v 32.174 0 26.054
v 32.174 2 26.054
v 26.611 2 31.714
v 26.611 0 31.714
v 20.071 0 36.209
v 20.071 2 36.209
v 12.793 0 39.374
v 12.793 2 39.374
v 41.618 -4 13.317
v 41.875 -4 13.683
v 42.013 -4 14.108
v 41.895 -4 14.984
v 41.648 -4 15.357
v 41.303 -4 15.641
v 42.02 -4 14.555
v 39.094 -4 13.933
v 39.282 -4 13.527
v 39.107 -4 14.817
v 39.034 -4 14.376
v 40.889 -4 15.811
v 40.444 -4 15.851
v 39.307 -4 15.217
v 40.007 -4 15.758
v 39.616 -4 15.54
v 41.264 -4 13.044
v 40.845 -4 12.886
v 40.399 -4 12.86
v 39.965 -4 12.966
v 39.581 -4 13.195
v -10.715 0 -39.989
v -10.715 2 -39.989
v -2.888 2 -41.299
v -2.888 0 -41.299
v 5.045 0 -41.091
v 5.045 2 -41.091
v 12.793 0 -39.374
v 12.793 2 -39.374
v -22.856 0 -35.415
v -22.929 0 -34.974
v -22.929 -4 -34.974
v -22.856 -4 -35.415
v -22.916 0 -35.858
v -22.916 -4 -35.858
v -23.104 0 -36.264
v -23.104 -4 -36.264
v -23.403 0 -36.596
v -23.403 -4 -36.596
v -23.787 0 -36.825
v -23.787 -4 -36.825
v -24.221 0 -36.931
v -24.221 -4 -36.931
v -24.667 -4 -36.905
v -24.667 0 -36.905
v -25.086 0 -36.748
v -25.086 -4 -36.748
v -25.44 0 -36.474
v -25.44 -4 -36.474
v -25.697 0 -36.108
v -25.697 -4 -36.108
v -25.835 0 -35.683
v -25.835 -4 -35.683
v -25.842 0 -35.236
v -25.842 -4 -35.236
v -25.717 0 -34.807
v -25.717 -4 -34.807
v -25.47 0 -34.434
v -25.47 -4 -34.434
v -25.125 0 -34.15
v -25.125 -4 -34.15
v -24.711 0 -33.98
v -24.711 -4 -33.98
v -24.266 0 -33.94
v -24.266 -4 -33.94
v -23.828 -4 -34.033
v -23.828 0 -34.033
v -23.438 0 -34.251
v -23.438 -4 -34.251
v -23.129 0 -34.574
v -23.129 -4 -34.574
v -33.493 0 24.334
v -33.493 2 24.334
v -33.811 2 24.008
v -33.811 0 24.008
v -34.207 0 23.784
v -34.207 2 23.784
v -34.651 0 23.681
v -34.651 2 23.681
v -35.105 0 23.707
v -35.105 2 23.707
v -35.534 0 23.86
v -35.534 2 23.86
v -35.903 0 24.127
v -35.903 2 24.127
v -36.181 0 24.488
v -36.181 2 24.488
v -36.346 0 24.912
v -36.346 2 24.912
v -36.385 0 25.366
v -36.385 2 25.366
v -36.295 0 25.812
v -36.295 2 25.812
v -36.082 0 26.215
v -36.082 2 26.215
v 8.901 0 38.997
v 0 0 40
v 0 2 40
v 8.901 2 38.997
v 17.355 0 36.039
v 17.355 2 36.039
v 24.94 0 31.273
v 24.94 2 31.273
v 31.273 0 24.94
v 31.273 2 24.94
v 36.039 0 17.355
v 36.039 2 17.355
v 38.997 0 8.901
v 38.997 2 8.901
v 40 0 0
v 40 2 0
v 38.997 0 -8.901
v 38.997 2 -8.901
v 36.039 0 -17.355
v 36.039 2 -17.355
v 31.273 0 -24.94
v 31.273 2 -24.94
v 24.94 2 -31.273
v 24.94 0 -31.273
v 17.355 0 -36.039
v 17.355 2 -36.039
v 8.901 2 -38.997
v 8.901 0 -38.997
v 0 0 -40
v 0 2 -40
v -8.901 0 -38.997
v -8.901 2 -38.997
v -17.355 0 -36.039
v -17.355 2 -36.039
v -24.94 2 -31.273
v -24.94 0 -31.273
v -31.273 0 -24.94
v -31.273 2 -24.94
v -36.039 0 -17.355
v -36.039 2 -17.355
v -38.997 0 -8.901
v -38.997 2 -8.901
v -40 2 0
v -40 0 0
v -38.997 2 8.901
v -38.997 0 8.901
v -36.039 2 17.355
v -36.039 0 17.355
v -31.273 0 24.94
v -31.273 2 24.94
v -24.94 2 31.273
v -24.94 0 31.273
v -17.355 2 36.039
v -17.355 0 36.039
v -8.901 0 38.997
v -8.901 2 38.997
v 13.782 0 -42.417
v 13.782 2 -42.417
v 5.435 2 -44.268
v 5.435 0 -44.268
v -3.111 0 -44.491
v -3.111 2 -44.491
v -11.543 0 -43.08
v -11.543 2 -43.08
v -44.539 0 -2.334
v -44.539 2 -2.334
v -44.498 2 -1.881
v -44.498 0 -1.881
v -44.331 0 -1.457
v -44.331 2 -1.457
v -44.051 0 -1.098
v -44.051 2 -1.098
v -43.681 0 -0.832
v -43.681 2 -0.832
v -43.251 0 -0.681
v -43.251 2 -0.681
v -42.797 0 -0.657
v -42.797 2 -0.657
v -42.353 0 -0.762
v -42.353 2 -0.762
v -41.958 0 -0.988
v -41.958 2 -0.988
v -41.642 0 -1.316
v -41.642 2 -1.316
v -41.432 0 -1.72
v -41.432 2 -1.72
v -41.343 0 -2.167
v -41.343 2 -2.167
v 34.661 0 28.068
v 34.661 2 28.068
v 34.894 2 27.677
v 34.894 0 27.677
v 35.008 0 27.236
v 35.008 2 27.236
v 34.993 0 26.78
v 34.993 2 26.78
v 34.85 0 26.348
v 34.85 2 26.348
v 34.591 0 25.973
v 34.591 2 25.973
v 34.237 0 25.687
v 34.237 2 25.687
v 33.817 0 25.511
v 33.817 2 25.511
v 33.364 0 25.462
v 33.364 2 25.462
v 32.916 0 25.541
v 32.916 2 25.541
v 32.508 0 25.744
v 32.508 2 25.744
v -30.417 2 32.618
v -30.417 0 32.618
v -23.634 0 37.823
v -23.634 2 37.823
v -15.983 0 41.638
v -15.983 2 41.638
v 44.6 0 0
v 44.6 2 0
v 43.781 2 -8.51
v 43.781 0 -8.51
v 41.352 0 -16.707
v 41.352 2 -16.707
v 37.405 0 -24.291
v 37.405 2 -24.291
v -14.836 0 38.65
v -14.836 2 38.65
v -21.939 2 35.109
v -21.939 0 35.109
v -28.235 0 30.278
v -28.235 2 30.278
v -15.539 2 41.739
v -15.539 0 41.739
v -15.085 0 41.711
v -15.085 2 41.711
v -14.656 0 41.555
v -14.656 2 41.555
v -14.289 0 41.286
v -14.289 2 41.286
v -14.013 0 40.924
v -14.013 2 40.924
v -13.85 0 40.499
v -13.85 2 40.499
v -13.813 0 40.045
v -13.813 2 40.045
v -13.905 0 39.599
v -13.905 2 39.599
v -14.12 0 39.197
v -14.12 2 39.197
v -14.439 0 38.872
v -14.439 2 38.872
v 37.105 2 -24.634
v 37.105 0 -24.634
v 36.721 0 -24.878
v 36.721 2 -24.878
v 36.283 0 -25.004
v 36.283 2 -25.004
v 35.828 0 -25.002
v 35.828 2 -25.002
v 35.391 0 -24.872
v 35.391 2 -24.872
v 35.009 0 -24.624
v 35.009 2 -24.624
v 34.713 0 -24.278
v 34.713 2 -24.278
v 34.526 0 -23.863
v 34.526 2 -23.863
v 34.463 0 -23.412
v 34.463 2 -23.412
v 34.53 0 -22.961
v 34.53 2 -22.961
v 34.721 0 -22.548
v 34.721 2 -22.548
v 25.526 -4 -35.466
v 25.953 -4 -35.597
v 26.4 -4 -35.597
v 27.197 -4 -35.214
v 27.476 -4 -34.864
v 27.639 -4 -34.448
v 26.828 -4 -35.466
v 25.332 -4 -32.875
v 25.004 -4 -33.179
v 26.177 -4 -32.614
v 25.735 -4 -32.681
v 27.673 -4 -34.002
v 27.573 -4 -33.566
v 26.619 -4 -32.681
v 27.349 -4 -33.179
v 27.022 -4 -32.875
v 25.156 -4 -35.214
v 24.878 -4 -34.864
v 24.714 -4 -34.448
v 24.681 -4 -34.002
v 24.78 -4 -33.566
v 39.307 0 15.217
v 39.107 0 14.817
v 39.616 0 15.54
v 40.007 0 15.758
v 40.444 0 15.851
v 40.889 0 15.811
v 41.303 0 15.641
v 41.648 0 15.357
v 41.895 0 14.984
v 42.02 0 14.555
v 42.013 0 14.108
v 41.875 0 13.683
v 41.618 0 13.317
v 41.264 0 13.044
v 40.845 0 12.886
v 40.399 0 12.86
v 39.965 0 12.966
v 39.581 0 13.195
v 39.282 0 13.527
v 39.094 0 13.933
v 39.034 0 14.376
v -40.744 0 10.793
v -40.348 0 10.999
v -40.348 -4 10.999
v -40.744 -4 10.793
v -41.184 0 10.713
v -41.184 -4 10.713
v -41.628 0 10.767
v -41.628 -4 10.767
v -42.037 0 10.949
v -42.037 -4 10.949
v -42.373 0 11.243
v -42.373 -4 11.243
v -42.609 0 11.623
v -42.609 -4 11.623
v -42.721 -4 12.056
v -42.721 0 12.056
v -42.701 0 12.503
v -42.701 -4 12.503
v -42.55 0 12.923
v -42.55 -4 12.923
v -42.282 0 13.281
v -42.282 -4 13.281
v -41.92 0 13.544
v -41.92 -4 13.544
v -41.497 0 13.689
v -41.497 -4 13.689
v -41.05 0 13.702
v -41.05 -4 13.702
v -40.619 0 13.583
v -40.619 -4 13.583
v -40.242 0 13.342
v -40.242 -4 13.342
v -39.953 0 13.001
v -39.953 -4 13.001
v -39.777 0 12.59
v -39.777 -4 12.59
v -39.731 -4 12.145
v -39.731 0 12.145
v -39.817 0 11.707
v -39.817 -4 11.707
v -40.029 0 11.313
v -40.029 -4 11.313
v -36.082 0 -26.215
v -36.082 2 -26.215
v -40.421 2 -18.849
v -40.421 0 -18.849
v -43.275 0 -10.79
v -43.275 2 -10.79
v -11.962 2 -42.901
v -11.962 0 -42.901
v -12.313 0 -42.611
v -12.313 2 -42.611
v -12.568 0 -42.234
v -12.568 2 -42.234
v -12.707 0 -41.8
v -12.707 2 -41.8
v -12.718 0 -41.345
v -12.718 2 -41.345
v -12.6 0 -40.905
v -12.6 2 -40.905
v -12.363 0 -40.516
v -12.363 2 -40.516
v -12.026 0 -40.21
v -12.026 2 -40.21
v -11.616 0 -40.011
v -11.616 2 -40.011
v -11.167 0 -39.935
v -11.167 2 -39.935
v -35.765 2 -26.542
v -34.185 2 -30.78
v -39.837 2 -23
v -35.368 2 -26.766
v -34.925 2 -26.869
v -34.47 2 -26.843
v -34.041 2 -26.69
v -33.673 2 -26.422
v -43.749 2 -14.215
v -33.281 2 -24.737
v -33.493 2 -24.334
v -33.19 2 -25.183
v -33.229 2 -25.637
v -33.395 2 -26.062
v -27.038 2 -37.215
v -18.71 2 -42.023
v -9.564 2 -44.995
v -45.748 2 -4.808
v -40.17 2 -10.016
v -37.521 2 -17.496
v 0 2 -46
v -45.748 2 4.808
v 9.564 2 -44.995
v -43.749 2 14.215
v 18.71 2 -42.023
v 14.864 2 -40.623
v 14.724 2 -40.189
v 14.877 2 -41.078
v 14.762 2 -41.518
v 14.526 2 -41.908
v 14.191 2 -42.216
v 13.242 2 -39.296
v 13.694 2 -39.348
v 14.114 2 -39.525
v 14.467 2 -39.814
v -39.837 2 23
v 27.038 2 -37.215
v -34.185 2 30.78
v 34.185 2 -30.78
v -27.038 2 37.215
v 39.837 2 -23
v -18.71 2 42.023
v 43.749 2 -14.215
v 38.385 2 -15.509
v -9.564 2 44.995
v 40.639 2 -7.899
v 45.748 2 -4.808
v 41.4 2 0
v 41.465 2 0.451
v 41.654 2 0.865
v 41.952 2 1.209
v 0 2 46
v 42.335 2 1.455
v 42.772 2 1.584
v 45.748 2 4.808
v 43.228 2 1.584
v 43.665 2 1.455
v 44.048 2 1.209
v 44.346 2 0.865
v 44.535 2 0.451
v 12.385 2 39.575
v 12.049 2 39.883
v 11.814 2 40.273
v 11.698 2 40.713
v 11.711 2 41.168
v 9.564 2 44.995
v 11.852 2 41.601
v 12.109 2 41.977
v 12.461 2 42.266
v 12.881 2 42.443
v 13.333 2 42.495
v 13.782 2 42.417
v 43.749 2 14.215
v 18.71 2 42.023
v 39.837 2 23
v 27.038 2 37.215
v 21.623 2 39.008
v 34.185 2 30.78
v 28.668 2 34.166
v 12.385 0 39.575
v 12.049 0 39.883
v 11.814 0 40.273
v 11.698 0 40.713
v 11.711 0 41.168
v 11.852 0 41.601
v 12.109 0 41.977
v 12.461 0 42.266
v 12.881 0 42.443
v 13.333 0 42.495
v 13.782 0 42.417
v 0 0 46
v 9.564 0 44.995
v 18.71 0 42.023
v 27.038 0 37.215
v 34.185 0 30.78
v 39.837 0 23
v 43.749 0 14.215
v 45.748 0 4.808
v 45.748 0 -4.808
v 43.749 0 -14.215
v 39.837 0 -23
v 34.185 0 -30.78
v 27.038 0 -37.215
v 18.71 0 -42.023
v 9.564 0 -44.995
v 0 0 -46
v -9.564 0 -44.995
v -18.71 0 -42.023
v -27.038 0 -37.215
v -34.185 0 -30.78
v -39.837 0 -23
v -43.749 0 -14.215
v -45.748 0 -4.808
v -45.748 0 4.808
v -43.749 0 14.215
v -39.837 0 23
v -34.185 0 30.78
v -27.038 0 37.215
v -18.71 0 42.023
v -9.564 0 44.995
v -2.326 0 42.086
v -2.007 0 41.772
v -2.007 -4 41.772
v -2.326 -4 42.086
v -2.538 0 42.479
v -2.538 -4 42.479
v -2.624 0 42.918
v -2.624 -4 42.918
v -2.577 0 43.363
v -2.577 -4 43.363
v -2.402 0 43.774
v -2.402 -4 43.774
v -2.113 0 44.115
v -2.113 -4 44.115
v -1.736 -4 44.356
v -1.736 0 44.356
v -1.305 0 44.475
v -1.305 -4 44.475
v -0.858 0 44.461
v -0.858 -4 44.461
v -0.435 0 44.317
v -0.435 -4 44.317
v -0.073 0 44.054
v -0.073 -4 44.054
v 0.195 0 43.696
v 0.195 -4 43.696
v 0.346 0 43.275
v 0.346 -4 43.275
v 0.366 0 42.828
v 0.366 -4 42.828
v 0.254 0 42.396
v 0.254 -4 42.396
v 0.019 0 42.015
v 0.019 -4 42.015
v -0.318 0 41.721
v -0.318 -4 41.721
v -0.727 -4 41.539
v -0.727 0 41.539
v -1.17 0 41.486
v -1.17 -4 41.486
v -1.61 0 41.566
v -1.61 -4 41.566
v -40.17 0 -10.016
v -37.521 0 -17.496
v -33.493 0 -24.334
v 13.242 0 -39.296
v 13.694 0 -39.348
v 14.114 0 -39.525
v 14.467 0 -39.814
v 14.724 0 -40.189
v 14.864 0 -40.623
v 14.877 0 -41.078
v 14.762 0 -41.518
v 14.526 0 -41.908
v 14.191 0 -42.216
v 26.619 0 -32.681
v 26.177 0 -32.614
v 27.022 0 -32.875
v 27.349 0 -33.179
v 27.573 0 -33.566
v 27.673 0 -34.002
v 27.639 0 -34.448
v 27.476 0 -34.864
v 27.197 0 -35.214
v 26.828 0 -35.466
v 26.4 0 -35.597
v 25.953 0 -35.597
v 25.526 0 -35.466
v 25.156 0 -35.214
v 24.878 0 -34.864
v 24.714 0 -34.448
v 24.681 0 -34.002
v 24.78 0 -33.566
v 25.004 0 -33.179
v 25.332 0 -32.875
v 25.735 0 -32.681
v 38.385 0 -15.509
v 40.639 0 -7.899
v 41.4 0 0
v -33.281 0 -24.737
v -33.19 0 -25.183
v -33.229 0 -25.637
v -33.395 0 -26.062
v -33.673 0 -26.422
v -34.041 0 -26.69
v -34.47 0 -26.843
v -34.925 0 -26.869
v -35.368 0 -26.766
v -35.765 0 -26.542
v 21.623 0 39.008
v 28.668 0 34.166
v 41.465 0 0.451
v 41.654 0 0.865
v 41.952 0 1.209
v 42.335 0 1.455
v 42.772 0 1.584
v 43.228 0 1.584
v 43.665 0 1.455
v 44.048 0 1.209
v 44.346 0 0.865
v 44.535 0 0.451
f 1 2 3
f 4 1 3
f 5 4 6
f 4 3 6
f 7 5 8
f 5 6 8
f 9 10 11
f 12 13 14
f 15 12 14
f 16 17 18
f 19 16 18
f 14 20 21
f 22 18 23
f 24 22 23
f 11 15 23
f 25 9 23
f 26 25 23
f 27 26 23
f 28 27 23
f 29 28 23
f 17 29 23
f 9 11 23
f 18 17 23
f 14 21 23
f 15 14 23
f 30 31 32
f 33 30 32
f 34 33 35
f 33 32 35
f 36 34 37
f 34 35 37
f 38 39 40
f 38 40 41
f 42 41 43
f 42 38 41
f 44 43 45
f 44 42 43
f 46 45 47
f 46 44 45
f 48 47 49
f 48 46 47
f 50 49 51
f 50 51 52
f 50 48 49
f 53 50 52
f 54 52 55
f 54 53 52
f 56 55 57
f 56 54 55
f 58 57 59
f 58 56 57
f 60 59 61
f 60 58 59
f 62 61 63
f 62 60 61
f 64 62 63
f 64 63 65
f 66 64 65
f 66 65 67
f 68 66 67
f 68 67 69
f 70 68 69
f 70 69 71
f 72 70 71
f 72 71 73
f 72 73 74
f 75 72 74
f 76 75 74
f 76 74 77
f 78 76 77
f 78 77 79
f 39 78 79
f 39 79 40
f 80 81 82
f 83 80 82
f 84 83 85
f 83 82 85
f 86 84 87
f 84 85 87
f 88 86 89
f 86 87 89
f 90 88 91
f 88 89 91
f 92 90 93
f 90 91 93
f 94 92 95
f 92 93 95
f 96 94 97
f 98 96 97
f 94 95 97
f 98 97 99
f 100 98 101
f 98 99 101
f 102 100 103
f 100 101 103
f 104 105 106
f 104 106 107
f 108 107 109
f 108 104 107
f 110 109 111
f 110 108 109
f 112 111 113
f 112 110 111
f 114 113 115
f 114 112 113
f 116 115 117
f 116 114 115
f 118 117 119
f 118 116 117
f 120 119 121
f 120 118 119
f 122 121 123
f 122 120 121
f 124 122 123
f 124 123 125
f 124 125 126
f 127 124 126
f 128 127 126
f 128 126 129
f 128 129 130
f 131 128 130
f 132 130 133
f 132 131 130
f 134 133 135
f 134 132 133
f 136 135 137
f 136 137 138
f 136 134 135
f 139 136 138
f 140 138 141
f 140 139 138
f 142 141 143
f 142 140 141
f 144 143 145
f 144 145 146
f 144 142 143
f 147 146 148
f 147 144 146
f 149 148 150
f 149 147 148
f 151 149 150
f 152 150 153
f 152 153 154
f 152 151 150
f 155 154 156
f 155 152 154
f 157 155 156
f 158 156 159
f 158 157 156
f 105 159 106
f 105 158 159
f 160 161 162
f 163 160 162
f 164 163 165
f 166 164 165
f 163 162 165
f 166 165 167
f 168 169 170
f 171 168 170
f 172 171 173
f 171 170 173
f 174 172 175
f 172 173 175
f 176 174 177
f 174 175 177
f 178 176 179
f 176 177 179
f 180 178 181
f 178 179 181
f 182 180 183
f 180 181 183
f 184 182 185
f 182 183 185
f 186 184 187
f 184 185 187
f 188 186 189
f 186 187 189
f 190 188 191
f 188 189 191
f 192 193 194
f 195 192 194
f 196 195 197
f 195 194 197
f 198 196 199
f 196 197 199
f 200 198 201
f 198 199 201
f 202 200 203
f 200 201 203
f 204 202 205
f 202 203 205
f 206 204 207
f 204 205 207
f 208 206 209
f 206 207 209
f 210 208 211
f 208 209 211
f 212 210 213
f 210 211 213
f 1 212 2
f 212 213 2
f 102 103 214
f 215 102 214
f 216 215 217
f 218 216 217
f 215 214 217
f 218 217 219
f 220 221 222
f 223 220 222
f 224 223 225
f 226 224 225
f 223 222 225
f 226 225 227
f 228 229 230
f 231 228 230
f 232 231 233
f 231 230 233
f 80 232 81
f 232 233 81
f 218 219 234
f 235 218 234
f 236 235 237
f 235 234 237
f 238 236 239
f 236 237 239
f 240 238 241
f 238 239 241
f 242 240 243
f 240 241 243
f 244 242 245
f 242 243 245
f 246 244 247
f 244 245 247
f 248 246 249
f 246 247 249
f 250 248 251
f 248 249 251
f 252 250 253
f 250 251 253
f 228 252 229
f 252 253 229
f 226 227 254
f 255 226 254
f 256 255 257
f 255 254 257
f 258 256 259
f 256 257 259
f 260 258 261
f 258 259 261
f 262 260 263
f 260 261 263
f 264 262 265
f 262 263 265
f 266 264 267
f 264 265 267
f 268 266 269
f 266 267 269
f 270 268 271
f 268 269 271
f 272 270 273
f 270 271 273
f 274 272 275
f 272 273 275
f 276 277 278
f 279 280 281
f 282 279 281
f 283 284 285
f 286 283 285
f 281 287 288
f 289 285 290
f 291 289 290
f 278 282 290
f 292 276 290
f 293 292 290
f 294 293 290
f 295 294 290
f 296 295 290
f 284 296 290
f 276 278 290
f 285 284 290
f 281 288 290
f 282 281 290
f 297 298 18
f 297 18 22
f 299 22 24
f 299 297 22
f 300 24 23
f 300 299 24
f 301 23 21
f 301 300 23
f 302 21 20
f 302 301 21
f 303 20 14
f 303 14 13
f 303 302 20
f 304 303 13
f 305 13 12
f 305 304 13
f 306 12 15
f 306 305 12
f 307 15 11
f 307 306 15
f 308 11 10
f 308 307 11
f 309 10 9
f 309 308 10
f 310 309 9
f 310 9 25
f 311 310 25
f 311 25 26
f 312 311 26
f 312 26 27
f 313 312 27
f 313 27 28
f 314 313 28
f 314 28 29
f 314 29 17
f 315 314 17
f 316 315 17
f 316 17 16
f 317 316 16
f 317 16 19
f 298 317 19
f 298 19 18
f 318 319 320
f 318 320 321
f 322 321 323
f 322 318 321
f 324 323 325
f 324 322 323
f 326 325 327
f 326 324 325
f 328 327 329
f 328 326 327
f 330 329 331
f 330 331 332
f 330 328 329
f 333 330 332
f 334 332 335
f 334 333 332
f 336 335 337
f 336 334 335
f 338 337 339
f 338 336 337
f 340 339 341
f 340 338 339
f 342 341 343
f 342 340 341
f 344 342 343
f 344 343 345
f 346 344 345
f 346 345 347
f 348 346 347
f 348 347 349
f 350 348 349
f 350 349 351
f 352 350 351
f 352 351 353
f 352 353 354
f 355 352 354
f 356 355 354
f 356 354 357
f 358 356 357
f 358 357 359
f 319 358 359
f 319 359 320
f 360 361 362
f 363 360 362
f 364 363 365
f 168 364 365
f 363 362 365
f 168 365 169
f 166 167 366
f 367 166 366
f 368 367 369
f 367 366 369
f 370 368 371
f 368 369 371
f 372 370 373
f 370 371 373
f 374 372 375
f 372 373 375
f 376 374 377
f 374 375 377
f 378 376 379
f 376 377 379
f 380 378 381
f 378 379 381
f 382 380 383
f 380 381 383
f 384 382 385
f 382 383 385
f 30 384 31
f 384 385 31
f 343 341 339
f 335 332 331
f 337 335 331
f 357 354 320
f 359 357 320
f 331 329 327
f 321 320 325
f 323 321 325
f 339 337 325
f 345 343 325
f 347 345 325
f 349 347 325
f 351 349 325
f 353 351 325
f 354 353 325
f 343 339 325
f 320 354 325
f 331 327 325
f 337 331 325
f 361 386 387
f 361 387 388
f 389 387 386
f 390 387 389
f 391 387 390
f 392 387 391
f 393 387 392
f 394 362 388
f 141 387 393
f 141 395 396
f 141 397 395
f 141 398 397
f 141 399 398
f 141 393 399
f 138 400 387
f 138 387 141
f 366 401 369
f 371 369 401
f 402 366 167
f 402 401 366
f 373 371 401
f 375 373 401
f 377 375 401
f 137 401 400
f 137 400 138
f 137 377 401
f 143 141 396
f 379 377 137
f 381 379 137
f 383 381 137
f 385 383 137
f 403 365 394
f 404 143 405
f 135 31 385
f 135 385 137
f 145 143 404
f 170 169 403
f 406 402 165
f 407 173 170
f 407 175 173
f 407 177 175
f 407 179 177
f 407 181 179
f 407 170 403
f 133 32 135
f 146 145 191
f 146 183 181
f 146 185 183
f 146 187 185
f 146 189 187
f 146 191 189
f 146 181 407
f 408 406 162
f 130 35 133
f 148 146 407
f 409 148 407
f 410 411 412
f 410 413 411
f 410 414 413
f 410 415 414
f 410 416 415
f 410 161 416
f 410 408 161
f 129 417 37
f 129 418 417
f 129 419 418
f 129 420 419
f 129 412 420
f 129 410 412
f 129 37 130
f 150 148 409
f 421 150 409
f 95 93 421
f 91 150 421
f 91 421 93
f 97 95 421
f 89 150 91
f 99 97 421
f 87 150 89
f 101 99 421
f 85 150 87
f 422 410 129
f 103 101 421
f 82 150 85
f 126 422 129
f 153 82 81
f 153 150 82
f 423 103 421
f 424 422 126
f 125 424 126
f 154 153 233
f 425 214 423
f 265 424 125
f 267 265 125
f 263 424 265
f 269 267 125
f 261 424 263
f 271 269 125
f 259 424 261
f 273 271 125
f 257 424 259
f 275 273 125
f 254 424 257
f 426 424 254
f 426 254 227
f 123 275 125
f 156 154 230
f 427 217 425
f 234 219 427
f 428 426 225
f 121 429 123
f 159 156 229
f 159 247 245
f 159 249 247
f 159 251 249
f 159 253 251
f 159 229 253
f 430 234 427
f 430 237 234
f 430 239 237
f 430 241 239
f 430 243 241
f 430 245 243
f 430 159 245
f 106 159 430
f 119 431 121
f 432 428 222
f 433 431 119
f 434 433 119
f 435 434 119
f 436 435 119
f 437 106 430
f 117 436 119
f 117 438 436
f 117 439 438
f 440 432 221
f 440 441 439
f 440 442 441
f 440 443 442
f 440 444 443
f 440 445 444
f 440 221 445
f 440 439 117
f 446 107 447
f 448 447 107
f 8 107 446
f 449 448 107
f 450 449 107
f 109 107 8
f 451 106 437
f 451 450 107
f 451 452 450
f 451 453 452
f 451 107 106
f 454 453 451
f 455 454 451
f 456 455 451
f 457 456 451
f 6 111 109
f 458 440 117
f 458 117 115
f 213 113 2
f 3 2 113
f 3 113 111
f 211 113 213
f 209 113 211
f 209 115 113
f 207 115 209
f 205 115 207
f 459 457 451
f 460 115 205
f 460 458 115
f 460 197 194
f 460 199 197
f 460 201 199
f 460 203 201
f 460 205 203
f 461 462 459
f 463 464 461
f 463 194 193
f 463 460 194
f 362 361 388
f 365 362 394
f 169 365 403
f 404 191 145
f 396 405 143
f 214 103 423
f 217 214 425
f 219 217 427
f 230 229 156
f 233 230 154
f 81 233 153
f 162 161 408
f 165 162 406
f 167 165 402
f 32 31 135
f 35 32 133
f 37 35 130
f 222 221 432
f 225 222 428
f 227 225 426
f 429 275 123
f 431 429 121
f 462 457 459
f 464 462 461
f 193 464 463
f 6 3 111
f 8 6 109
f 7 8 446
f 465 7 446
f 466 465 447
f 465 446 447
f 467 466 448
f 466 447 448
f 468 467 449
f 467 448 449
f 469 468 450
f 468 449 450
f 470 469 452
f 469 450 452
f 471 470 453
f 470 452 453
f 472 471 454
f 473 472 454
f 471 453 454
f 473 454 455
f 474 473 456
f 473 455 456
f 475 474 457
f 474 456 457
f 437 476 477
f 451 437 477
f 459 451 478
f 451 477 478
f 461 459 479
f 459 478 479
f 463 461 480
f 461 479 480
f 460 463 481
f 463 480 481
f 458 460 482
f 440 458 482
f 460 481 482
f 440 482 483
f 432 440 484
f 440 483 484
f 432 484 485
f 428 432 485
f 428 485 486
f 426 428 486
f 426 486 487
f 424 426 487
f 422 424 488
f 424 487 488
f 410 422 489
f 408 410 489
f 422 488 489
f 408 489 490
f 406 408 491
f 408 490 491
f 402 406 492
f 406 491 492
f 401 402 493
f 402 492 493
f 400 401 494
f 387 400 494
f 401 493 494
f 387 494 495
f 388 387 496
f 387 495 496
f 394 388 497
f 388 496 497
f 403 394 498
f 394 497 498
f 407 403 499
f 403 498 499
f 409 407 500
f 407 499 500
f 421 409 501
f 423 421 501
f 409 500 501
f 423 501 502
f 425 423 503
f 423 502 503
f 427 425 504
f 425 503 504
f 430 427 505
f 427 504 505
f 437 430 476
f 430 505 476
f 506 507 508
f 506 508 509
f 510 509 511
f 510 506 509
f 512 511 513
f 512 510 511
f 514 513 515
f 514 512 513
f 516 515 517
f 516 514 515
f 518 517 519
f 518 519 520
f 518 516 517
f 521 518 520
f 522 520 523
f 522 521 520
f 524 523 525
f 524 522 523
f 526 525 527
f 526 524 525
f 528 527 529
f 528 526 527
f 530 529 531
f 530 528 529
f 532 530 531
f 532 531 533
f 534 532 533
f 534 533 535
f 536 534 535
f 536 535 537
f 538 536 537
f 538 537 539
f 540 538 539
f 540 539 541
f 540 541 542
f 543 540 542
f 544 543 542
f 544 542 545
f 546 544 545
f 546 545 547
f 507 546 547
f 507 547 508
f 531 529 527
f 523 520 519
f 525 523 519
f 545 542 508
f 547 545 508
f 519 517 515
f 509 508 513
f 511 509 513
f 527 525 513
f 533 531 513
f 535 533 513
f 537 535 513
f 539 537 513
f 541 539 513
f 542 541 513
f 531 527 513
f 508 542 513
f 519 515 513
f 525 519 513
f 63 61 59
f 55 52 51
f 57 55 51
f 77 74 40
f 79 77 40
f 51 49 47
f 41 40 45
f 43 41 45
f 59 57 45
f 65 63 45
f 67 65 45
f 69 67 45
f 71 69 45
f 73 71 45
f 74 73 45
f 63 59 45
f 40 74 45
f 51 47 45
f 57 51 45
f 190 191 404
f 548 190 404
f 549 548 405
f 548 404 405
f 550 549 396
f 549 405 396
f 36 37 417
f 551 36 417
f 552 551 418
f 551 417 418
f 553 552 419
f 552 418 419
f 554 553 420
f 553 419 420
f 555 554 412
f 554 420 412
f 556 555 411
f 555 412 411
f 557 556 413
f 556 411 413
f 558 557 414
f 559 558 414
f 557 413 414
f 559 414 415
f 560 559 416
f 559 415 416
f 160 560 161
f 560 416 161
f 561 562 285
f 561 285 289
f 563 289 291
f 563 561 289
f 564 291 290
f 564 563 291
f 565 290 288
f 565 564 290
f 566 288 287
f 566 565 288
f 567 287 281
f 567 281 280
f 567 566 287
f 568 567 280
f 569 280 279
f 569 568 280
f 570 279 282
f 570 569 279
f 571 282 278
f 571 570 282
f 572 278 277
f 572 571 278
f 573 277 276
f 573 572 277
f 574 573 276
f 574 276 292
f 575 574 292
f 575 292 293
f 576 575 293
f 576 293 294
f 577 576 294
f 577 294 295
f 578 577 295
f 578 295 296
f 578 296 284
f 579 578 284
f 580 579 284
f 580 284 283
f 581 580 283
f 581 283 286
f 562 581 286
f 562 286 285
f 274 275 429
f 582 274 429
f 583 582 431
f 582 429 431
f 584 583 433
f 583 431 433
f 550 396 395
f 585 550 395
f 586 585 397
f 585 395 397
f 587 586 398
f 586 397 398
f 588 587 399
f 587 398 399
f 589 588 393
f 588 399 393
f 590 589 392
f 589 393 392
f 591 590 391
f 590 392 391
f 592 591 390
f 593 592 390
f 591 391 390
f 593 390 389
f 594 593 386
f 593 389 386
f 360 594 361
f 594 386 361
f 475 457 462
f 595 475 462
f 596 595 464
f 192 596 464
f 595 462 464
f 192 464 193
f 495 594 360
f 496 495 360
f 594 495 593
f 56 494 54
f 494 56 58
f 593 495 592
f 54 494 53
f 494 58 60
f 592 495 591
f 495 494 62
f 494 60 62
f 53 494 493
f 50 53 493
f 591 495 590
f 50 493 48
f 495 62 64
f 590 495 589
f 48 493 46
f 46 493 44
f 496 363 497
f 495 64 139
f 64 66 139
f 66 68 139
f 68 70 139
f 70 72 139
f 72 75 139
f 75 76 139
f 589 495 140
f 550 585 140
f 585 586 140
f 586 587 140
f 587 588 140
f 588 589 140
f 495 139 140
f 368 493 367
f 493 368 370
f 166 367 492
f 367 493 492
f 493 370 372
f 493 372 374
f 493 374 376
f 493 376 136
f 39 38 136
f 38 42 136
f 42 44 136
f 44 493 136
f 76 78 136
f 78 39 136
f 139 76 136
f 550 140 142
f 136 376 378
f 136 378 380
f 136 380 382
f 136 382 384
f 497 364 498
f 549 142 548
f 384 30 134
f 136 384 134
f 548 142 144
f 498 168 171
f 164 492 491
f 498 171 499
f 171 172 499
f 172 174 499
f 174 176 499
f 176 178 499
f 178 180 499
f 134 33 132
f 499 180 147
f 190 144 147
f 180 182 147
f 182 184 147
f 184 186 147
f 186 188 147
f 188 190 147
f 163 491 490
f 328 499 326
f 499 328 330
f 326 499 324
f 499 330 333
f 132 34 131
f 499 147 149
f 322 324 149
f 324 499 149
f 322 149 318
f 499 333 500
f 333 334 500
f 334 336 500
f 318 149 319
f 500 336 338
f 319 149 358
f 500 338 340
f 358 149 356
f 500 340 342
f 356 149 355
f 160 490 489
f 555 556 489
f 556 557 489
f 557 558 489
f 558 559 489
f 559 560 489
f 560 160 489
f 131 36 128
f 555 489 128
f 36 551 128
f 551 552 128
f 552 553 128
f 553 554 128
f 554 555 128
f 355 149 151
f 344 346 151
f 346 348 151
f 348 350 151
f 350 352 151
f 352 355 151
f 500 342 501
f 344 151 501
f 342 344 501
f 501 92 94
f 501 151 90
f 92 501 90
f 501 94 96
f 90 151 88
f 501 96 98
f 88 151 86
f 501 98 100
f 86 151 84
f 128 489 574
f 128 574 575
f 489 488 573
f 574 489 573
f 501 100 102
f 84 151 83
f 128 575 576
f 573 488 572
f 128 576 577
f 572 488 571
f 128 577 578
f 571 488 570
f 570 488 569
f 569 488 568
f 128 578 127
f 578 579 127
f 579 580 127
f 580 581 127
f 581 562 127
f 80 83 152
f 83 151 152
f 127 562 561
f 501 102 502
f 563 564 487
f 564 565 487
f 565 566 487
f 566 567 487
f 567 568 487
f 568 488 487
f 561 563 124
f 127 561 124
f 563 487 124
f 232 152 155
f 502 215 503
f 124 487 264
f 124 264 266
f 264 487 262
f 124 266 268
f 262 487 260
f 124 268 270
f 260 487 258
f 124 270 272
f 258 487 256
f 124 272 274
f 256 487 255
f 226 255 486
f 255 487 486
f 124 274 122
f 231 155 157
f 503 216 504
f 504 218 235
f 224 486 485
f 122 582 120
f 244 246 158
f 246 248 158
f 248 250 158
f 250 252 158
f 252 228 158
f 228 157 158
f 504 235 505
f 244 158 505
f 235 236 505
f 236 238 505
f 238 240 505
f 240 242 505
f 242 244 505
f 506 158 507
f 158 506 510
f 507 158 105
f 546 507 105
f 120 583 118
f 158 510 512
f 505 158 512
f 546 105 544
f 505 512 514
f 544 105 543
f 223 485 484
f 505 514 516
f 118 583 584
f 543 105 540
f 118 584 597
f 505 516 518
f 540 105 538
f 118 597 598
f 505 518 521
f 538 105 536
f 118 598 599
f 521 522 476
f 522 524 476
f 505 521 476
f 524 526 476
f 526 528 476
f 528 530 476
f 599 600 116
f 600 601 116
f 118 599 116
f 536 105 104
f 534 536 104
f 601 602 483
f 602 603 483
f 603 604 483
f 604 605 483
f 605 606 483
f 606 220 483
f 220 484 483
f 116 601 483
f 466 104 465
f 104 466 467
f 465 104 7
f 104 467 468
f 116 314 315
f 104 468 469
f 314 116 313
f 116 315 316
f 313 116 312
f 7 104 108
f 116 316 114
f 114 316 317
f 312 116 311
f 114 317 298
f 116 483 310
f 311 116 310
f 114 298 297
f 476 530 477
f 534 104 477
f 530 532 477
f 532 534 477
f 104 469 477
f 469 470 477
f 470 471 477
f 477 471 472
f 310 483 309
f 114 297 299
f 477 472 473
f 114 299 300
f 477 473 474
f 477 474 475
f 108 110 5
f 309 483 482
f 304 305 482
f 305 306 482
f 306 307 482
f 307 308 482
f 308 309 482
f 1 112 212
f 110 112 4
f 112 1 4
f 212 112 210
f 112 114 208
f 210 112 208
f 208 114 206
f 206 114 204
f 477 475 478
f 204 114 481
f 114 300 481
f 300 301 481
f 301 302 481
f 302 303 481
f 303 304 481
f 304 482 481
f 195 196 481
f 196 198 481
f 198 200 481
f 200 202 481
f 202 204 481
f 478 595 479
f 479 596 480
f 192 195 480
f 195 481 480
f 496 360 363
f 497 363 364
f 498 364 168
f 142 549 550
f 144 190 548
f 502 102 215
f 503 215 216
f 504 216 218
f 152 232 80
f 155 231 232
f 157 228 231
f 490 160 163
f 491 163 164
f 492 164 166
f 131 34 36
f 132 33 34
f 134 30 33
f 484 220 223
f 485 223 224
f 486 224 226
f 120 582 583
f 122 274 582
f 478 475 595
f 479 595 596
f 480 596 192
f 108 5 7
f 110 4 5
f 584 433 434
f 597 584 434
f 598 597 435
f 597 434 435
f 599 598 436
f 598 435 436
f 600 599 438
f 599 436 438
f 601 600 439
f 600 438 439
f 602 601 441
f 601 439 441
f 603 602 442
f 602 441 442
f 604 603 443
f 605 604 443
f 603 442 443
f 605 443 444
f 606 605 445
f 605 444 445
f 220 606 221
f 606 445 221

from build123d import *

# Parameters (mm, degrees)
SKETCH1_R           = 46
SKETCH1_R_2         = 40
BOSS_EXTRUDE1_DEPTH = 2
CUT_EXTRUDE1_REACH  = 67.085
SKETCH2_R           = 1.5
SKETCH3_R           = 1.5
BOSS_EXTRUDE2_DEPTH = 6
CIRPATTERN1_COUNT   = 5


with BuildPart() as part:
    # Sketch1 → Boss-Extrude1 (new body)
    with BuildSketch(Plane(origin=(0, 0, 0), x_dir=(1, 0, 0), z_dir=(0, 1, 0))):
        with Locations(Location((0, 0, 0), (0, 0, 270))):
            Circle(SKETCH1_R)
        with Locations(Location((0, 0, 0), (0, 0, 270))):
            Circle(SKETCH1_R_2, mode=Mode.SUBTRACT)
    extrude(amount=BOSS_EXTRUDE1_DEPTH)

    # Sketch2 → Cut-Extrude1 (cut, up to next)
    with BuildSketch(Plane(origin=(0, 2, 0), x_dir=(1, 0, 0), z_dir=(0, 1, 0)), mode=Mode.PRIVATE) as cut_extrude1_sk1:
        with Locations(Location((26.176741447, 34.114193633, 0), (0, 0, 270))):
            Circle(SKETCH2_R)
    cut_extrude1_tool1 = extrude(cut_extrude1_sk1.sketch, amount=-CUT_EXTRUDE1_REACH, mode=Mode.PRIVATE) & part.part
    # Sketch2 → Cut-Extrude1 (cut, up to next)
    with BuildSketch(Plane(origin=(0, 2, 0), x_dir=(1, 0, 0), z_dir=(0, 1, 0)), mode=Mode.PRIVATE) as cut_extrude1_sk2:
        with BuildLine():
            ThreePointArc((44.6, 0), (42.763360175, 12.667084374), (37.40470733, 24.290900962))
            ThreePointArc((37.40470733, 24.290900962), (35.191411966, 24.761351414), (34.720961513, 22.54805605))
            ThreePointArc((34.720961513, 22.54805605), (39.695137024, 11.758235271), (41.4, 0))
            ThreePointArc((41.4, 0), (43, -1.6), (44.6, 0))
        make_face()
    cut_extrude1_tool2 = extrude(cut_extrude1_sk2.sketch, amount=-CUT_EXTRUDE1_REACH, mode=Mode.PRIVATE) & part.part
    cut_extrude1_1 = cut_extrude1_tool1.solids().sort_by_distance((26.176741, 2, -34.114194))[0]
    add(cut_extrude1_1, mode=Mode.SUBTRACT)
    cut_extrude1_2 = cut_extrude1_tool2.solids().sort_by_distance((40.557599, 2, -12.013708))[0]
    add(cut_extrude1_2, mode=Mode.SUBTRACT)
    cut_extrude1 = cut_extrude1_1 + cut_extrude1_2  # Cut-Extrude1 as one shape, for the pattern or mirror that repeats it

    # Sketch3 → Boss-Extrude2 (add)
    with BuildSketch(Plane(origin=(0, 2, 0), x_dir=(1, 0, 0), z_dir=(0, 1, 0))):
        with Locations(Location((26.176741447, 34.114193633, 0), (0, 0, 270))):
            Circle(SKETCH3_R)
    boss_extrude2 = extrude(amount=-BOSS_EXTRUDE2_DEPTH)

    # CirPattern1: Cut-Extrude1, Boss-Extrude2 ×5 about axis
    cirpattern1_axis = Axis((0, 0, 0), (0, 1, 0))
    add([cut_extrude1.rotate(cirpattern1_axis, i * 360 / CIRPATTERN1_COUNT) for i in range(1, CIRPATTERN1_COUNT)], mode=Mode.SUBTRACT)
    add([boss_extrude2.rotate(cirpattern1_axis, i * 360 / CIRPATTERN1_COUNT) for i in range(1, CIRPATTERN1_COUNT)])


solid = part.part
